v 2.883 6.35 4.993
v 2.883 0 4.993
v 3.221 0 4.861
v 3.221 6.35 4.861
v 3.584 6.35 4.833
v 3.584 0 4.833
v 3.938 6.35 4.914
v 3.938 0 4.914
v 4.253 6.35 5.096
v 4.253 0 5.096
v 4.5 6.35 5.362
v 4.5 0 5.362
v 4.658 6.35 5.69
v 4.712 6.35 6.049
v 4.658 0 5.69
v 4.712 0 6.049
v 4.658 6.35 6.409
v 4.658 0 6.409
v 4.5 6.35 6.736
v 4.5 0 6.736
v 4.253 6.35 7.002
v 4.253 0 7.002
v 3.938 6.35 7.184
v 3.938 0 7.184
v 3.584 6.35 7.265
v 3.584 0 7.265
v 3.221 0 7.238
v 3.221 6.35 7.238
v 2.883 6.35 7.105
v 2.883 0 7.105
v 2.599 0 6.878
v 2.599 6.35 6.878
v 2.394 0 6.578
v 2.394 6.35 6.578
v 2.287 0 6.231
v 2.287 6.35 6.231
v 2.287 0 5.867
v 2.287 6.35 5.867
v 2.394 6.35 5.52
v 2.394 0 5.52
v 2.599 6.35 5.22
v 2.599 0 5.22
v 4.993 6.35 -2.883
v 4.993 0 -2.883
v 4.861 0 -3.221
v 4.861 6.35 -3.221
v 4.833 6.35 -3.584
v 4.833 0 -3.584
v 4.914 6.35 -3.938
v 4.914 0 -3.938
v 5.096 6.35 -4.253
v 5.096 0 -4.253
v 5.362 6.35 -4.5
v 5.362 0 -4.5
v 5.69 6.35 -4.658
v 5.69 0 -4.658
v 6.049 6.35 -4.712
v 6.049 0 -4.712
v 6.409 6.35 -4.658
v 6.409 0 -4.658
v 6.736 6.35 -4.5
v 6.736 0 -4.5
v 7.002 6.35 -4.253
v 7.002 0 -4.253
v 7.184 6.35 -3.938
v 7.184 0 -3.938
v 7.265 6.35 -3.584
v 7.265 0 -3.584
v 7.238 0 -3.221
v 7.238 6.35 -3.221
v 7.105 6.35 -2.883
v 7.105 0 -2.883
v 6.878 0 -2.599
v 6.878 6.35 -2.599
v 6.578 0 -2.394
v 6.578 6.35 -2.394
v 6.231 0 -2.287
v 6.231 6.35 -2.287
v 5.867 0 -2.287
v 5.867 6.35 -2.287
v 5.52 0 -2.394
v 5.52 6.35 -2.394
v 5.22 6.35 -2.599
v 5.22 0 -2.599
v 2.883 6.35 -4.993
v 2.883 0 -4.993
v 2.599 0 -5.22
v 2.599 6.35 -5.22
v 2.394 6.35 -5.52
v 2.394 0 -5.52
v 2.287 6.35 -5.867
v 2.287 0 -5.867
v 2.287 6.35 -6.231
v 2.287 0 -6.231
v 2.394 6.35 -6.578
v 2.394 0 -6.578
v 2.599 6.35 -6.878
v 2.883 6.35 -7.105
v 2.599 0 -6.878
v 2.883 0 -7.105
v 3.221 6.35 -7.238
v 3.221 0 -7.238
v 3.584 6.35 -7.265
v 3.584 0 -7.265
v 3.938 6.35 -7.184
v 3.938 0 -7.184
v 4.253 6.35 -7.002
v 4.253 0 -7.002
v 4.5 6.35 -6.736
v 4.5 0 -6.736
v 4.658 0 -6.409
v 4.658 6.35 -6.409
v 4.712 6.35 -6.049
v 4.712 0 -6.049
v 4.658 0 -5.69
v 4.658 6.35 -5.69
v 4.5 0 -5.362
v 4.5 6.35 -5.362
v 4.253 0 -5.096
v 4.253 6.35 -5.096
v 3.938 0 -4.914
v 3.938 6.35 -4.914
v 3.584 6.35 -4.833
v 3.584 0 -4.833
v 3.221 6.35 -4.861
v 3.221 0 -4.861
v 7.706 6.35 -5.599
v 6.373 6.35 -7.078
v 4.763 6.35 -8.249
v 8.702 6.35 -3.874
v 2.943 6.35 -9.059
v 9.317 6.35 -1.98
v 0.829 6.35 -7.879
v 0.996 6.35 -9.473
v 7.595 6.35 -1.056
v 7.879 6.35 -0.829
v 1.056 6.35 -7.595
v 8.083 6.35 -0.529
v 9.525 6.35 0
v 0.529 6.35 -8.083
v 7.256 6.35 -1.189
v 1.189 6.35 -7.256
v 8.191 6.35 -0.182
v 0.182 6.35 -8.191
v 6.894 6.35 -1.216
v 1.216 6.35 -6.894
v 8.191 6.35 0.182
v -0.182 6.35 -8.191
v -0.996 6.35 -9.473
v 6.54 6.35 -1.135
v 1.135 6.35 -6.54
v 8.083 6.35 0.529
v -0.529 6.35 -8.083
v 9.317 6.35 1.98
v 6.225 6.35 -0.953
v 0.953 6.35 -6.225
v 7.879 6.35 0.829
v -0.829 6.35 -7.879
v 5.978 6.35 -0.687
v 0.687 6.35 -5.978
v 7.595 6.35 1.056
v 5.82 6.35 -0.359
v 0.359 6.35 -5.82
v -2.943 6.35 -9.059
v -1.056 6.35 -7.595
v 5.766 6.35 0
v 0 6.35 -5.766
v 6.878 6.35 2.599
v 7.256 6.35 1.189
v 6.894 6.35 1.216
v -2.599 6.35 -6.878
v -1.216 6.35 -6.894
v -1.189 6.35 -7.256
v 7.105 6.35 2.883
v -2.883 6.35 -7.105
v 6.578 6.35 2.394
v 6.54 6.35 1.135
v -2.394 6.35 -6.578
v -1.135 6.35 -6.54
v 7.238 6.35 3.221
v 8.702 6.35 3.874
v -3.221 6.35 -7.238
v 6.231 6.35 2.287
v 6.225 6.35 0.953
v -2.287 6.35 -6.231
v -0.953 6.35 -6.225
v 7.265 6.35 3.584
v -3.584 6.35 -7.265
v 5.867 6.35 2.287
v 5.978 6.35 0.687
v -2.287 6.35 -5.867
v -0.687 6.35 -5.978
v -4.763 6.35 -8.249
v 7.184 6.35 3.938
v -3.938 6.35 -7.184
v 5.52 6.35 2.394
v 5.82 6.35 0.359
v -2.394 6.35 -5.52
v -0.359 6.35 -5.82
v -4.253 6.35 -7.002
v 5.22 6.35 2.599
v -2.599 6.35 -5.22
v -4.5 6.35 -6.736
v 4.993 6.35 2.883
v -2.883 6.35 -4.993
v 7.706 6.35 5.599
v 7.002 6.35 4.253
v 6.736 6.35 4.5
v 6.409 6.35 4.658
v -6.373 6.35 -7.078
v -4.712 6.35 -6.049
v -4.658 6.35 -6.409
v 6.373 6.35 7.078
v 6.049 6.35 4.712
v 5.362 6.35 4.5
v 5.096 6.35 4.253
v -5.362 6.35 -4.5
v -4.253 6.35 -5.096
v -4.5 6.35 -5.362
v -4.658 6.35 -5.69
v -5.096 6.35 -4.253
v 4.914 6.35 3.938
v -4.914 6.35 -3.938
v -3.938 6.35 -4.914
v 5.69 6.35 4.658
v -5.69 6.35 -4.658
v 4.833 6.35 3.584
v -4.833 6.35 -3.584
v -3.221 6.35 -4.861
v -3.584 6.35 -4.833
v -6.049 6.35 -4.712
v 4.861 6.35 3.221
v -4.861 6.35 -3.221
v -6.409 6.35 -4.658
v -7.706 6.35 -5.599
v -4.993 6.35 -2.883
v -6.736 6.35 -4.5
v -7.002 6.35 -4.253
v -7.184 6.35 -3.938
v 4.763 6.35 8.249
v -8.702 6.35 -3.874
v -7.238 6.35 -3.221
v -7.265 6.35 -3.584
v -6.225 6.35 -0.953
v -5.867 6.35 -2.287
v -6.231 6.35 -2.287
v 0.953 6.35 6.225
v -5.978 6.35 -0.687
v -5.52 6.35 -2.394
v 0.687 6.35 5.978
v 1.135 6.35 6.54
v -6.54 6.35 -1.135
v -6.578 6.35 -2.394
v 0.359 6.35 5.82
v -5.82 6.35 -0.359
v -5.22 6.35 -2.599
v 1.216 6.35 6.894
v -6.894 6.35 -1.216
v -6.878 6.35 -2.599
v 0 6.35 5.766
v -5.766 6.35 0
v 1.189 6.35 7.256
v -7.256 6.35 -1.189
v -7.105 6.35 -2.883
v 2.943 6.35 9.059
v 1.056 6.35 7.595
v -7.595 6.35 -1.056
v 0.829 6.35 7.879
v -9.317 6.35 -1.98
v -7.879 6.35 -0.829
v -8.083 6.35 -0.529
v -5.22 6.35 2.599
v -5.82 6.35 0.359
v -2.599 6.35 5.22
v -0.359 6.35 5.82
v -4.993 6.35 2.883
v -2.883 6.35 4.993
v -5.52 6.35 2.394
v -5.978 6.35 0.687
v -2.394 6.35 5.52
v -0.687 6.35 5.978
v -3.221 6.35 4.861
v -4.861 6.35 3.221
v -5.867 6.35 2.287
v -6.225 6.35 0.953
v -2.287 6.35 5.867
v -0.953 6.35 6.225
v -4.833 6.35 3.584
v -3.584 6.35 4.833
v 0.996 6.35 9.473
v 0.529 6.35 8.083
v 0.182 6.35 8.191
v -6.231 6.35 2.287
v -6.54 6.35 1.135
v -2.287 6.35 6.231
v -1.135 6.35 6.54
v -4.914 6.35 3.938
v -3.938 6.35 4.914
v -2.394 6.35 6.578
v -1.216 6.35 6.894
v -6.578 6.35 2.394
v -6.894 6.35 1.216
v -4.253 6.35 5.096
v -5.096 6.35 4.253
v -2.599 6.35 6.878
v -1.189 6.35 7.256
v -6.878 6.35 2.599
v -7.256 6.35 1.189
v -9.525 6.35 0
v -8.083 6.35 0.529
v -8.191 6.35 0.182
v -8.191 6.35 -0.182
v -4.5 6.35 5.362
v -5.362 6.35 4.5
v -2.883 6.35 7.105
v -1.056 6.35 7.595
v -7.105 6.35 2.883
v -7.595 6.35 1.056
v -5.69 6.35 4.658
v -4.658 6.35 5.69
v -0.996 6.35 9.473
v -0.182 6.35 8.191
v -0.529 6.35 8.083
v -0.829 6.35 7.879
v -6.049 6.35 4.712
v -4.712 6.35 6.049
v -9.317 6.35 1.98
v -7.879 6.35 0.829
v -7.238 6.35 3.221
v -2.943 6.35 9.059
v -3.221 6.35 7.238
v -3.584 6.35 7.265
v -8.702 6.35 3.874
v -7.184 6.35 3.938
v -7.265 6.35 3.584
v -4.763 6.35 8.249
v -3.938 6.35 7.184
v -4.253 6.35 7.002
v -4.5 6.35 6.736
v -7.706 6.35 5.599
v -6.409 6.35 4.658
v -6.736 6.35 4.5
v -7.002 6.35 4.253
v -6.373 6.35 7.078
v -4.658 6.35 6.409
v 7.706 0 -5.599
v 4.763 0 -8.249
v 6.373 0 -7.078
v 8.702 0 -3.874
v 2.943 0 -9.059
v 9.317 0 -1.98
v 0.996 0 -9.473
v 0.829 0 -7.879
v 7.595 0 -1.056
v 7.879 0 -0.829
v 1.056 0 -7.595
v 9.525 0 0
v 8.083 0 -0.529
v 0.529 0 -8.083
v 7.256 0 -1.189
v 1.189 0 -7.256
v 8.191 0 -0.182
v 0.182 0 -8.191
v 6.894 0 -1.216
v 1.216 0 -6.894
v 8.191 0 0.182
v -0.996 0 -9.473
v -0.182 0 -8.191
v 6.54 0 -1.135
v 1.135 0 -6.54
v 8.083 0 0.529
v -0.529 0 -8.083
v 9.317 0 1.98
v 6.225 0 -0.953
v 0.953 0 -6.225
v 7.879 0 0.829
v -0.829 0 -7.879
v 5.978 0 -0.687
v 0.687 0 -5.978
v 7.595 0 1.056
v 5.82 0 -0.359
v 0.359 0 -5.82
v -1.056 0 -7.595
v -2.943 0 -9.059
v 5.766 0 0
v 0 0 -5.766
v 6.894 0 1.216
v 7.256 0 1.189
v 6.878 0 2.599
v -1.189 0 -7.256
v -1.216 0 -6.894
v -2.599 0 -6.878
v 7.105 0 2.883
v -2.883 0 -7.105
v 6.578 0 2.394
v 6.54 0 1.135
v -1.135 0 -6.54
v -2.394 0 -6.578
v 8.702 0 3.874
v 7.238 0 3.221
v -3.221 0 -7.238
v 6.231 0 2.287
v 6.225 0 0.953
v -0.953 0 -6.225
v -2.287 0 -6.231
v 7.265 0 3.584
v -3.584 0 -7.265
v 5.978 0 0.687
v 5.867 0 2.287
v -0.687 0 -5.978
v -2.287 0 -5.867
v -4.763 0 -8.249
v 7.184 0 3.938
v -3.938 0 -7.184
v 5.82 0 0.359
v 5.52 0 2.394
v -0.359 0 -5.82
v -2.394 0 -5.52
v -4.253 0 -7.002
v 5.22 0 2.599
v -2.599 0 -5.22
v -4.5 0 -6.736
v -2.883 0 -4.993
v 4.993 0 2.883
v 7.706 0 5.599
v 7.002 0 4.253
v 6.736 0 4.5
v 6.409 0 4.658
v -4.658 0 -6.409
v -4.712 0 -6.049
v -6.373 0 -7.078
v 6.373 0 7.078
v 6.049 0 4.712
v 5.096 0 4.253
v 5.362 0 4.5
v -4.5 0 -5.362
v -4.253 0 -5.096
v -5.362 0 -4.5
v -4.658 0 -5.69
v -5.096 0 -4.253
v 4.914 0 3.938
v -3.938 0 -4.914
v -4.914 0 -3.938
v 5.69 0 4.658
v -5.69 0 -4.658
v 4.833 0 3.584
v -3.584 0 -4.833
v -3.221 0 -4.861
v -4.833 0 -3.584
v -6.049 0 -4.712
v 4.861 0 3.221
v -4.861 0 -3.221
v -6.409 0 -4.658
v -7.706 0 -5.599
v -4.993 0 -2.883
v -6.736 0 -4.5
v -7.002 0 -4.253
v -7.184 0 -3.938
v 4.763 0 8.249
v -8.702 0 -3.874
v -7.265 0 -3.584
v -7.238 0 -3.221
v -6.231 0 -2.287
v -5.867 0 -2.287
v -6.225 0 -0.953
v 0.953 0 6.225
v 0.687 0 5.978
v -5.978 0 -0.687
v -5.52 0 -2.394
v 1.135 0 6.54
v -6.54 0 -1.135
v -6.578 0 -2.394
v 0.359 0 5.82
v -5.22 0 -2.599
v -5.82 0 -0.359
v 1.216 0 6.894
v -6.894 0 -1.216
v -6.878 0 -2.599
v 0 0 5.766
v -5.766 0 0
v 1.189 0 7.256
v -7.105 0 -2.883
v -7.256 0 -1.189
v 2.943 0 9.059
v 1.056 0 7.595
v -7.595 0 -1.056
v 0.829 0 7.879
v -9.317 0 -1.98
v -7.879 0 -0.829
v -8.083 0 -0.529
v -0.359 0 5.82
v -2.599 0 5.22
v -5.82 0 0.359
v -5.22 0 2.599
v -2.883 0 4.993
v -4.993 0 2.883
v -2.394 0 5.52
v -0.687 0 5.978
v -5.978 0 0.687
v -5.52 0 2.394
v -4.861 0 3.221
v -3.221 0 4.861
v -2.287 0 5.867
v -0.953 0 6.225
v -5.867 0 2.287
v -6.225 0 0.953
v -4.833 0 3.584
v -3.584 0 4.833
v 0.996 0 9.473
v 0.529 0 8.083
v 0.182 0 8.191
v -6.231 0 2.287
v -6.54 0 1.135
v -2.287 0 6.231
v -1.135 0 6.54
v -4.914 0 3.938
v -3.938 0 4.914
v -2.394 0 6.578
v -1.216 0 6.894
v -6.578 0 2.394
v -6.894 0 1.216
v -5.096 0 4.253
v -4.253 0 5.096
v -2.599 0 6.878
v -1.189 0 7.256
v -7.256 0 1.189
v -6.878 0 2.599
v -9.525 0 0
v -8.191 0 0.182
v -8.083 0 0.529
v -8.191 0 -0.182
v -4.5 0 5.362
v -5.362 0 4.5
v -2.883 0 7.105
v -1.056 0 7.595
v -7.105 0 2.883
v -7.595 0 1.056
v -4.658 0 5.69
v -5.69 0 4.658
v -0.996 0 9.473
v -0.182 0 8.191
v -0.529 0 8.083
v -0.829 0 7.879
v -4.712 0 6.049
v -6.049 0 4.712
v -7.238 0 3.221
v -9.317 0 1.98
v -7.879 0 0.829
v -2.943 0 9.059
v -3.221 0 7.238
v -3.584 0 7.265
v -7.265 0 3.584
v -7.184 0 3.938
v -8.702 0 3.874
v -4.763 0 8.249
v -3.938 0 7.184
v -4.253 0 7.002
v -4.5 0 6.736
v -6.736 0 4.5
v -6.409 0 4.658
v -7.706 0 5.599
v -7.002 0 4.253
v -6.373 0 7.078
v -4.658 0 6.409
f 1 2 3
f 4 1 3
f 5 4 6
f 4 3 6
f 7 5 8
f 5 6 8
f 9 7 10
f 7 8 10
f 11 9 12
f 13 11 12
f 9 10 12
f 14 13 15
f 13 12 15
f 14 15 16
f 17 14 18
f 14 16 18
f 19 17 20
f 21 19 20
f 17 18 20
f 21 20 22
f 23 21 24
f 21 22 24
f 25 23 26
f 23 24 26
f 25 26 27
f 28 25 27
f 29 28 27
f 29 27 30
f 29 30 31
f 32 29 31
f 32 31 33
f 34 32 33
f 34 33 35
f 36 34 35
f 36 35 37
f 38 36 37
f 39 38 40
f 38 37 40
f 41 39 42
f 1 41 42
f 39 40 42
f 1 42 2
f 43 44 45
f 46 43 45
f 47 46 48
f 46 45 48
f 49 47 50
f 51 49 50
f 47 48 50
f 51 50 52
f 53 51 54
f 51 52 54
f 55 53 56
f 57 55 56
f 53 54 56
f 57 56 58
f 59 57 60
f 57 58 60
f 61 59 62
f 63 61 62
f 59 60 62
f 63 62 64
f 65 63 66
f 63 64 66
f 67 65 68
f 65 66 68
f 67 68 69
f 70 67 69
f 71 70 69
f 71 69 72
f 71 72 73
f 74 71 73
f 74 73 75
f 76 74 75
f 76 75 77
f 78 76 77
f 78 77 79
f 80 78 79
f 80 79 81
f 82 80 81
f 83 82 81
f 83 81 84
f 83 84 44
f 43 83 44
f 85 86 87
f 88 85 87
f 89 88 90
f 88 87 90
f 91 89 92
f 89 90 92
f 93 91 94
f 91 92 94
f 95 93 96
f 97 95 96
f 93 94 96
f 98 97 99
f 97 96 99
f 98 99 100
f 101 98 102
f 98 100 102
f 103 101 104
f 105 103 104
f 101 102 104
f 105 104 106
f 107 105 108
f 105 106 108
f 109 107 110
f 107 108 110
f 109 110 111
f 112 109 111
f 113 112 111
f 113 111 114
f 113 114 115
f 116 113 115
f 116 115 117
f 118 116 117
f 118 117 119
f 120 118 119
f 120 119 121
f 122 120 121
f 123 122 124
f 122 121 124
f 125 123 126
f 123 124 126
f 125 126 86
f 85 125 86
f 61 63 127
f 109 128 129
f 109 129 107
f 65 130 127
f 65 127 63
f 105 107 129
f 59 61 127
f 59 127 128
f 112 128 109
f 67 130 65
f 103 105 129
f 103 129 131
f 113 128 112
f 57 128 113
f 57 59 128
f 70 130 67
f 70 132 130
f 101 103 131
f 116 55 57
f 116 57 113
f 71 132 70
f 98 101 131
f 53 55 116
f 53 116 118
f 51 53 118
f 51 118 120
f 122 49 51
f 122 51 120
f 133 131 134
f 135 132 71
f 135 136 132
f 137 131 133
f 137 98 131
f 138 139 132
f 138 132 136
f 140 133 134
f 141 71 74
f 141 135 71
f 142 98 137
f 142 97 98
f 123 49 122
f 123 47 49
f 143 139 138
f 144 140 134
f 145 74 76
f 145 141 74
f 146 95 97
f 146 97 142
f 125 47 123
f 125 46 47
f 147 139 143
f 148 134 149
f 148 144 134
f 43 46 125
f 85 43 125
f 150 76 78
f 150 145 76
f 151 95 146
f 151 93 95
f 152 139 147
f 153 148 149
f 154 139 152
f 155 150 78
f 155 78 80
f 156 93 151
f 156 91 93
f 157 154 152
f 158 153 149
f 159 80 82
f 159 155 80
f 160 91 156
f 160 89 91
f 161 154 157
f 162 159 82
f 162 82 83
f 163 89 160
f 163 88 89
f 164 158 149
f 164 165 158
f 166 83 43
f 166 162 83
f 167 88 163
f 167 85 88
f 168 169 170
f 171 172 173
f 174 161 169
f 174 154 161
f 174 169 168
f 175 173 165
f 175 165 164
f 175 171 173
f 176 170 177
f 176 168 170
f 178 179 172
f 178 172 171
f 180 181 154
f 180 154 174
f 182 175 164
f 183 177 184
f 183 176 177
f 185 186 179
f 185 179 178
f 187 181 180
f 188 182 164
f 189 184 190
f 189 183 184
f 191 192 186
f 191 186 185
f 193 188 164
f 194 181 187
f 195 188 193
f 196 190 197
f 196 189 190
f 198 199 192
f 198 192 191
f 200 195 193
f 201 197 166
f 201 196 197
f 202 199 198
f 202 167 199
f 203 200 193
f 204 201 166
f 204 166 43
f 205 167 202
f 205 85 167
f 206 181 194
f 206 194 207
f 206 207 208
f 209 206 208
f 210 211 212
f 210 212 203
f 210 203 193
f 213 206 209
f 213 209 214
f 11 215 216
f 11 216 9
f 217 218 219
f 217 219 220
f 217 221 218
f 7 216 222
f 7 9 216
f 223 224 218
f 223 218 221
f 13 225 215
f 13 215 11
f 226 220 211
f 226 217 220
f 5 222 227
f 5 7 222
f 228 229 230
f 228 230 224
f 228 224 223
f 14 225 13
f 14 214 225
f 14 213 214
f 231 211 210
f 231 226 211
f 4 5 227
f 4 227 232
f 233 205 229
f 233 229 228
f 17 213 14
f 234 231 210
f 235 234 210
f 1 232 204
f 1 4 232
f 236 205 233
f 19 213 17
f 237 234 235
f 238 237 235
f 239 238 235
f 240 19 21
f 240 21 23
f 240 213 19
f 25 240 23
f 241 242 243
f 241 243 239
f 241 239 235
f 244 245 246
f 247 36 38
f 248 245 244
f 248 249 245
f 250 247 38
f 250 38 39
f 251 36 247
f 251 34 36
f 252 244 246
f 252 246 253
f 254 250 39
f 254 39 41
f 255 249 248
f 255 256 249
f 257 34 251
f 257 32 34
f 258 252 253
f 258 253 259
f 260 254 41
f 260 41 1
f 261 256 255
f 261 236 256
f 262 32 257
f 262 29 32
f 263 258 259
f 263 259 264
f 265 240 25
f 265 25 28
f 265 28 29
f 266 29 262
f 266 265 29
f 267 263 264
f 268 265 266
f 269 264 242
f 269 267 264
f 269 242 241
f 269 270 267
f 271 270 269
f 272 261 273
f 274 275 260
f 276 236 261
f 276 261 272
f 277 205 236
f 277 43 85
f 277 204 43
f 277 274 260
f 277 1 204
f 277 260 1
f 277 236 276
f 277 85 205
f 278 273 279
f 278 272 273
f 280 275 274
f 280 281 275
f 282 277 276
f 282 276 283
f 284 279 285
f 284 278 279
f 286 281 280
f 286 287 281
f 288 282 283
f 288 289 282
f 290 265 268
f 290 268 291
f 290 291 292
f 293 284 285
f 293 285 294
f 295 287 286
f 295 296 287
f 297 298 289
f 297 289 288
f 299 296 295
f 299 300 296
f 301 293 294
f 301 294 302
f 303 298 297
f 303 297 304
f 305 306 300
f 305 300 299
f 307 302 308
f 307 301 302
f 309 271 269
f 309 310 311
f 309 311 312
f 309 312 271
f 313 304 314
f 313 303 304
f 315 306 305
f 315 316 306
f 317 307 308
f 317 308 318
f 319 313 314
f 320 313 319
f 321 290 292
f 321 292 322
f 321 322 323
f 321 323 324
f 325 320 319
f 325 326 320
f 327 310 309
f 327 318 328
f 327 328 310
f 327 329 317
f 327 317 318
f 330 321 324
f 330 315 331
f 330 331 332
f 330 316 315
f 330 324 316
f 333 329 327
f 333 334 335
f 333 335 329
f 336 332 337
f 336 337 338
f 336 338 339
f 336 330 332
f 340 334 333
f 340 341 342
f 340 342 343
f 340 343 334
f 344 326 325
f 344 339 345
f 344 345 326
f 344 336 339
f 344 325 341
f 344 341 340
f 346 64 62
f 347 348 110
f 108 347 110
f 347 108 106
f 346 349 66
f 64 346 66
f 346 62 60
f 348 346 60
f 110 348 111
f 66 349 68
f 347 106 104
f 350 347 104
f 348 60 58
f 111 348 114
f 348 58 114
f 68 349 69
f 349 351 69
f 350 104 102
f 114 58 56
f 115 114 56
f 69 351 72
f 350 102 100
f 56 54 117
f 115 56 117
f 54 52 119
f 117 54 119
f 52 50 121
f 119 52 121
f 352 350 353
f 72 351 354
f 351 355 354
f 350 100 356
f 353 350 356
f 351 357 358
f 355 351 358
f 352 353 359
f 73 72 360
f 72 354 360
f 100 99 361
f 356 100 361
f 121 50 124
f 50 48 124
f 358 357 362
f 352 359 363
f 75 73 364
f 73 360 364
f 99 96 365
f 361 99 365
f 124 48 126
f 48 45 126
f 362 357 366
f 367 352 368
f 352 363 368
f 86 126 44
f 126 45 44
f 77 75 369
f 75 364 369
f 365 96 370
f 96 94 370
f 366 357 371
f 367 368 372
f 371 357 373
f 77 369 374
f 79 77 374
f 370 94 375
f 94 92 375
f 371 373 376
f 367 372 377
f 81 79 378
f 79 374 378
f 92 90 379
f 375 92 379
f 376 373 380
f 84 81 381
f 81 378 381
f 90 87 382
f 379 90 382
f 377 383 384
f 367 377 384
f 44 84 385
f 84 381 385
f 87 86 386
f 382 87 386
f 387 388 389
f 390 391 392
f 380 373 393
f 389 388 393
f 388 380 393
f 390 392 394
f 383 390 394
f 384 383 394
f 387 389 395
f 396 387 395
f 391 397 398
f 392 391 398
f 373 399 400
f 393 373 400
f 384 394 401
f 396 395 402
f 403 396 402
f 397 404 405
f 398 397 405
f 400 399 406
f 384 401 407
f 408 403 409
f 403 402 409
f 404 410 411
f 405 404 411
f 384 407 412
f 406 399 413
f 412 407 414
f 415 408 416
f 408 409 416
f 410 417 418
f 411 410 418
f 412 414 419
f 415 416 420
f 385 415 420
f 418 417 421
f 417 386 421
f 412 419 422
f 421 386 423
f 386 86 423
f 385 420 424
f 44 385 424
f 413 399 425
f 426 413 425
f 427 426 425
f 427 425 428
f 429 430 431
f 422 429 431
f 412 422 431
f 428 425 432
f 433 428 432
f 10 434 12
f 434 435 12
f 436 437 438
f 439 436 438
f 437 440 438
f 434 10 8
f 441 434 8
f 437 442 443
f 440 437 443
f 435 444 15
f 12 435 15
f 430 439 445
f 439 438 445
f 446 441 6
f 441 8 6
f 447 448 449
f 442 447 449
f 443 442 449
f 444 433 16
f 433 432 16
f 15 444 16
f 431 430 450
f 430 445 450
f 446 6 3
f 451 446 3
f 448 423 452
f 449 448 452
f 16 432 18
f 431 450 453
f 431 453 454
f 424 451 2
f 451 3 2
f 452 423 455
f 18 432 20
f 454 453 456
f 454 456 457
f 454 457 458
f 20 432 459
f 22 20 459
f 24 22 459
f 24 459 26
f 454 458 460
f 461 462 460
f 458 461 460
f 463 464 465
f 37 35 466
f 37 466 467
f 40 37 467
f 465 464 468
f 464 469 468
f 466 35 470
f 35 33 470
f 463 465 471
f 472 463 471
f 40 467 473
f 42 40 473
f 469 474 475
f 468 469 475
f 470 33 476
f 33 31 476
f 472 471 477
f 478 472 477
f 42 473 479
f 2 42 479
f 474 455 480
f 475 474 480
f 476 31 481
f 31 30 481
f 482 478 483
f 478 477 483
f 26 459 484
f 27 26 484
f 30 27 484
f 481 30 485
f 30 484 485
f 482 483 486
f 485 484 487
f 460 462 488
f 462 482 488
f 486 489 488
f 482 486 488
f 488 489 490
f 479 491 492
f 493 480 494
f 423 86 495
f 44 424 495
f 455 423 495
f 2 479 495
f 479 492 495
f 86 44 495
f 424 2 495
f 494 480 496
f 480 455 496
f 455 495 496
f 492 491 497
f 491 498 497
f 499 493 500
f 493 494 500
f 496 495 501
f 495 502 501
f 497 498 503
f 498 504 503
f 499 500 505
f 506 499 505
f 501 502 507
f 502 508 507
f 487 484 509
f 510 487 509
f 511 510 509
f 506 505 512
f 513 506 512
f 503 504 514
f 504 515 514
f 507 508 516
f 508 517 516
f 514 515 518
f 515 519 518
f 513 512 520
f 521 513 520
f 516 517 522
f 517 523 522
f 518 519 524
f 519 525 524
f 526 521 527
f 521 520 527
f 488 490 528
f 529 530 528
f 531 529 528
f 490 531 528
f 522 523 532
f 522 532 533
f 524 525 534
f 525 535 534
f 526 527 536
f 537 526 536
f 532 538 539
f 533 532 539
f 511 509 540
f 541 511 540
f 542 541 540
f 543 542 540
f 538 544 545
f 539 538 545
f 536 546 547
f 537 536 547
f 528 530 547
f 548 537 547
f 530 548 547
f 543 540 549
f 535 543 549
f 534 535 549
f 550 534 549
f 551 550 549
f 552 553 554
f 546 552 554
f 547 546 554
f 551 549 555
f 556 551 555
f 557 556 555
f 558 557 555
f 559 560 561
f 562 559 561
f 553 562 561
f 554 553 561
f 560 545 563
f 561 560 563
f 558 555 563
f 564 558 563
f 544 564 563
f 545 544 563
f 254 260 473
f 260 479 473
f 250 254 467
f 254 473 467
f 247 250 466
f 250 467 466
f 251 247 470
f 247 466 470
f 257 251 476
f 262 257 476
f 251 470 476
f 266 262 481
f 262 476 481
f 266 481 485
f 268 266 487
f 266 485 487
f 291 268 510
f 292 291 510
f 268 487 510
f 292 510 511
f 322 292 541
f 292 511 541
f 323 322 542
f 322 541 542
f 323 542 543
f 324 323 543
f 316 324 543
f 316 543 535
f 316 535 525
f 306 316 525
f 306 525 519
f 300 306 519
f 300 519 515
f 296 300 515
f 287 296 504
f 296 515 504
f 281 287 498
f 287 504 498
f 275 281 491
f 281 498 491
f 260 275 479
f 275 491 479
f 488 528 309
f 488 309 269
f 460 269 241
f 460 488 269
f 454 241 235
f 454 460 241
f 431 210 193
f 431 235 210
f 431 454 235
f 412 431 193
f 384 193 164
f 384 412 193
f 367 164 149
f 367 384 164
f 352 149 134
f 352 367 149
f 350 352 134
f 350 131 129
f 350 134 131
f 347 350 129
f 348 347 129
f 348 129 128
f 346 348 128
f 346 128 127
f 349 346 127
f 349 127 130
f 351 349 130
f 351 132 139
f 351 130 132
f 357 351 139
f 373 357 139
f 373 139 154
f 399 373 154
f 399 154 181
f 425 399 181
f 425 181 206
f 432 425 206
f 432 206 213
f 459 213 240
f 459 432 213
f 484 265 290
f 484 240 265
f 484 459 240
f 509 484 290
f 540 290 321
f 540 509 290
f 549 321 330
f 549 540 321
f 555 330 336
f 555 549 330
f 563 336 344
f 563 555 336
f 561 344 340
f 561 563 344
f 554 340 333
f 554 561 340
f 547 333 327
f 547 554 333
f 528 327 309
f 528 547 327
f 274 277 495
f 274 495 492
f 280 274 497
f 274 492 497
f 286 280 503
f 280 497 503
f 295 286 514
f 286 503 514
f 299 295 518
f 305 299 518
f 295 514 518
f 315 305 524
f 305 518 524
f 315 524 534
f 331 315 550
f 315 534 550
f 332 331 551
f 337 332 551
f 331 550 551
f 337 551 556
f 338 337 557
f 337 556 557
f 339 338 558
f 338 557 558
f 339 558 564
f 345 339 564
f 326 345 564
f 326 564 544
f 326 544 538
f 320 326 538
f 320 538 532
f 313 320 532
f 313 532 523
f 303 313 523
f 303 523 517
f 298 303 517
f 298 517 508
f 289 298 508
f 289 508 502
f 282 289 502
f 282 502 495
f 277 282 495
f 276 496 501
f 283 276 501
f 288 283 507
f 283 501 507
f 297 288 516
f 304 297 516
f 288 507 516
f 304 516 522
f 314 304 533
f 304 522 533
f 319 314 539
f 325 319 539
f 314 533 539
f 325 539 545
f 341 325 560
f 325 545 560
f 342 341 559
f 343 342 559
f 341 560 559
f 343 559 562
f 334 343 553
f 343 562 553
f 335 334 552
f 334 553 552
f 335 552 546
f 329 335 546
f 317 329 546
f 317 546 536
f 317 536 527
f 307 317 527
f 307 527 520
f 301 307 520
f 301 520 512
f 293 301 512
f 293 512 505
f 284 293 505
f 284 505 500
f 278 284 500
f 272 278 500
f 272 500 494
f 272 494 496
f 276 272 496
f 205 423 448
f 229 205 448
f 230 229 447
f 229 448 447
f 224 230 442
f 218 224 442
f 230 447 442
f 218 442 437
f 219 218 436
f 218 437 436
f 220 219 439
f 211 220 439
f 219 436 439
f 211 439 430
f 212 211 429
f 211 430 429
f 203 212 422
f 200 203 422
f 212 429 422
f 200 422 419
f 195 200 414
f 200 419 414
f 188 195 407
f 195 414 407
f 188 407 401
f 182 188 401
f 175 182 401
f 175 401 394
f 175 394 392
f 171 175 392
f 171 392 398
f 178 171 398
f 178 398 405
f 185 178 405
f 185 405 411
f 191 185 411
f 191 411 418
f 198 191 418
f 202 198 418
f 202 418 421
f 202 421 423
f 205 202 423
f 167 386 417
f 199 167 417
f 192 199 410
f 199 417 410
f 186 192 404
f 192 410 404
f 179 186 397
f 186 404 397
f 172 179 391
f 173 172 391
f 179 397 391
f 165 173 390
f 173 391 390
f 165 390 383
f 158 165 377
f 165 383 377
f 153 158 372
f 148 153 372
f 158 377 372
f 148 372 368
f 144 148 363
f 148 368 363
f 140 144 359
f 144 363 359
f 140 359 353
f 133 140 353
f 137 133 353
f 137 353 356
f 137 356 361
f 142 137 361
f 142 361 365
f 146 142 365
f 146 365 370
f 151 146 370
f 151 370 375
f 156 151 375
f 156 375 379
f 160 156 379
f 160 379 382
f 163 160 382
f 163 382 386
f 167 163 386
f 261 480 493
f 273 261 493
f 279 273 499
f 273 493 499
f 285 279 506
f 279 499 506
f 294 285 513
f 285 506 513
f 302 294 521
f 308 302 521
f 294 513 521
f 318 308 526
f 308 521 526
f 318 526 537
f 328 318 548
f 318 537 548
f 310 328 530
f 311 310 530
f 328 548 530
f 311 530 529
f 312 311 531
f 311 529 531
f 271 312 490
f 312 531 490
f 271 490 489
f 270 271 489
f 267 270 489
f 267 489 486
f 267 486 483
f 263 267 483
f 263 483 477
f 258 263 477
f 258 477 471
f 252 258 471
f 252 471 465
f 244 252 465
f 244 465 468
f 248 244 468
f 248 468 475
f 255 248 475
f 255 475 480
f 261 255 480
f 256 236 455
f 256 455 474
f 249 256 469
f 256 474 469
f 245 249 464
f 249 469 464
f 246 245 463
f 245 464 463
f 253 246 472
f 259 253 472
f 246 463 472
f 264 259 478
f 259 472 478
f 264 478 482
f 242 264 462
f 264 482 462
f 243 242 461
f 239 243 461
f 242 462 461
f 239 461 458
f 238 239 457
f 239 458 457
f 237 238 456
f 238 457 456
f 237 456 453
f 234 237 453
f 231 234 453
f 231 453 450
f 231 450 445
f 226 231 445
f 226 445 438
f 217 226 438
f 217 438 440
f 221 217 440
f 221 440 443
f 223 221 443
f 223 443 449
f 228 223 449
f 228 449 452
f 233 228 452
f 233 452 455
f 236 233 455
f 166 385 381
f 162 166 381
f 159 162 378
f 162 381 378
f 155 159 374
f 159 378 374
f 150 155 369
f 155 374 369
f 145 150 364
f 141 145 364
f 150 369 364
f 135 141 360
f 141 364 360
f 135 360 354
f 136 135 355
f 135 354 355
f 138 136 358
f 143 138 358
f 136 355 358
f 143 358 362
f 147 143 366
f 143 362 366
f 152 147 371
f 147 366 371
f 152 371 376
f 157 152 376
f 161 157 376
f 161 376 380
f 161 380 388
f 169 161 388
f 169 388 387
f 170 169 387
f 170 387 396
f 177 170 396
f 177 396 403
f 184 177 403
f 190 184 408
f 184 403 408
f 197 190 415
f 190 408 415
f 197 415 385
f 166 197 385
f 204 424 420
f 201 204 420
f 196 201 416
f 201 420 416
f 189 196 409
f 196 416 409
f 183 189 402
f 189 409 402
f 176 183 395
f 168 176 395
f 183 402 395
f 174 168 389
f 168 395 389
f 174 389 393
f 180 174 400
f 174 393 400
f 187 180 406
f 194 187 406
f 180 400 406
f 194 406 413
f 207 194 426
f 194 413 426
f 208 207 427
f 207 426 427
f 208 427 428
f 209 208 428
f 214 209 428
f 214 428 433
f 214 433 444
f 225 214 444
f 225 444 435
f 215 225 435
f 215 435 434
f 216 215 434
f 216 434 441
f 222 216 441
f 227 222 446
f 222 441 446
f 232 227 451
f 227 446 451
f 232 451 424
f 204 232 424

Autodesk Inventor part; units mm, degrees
ref_plane "YZ Plane" through (0, 0, 0) normal (1, 0, 0) x (0, 1, 0)
ref_plane "XZ Plane" through (0, 0, 0) normal (0, 1, 0) x (-1, 0, 0)
ref_plane "XY Plane" through (0, 0, 0) normal (0, 0, 1) x (1, 0, 0)
sketch "Sketch1" plane through (0, 0, 0) normal (0, 1, 0) x (-1, 0, 0)
  circle A0 centre (0, 0) radius 9.525
  dimension "d0" = 19.05
extrude "Extrusion1" add sketch "Sketch1" along normal blind 6.35
sketch "Sketch2" plane through (0, 6.35, 0) normal (0, 1, 0) x (1, 0, 0)
  point P0 (0, 0)
  point P1 (0, 6.985)
  dimension "d3" = 6.985
hole "Hole1" at (0, 6.35, -6.985) direction (0, -1, 0) diameter 2.4384 end through all clearance for "Flat Head Machine Screw (82)" size "#2" standard "Ansi Unified Screw Threads"
pattern_circular "Circular Pattern1" count 12 over 360 about axis through (0, 0, 0) along (0, 1, 0) of "Hole1"
properties part number "ferris_wheel_hub"
